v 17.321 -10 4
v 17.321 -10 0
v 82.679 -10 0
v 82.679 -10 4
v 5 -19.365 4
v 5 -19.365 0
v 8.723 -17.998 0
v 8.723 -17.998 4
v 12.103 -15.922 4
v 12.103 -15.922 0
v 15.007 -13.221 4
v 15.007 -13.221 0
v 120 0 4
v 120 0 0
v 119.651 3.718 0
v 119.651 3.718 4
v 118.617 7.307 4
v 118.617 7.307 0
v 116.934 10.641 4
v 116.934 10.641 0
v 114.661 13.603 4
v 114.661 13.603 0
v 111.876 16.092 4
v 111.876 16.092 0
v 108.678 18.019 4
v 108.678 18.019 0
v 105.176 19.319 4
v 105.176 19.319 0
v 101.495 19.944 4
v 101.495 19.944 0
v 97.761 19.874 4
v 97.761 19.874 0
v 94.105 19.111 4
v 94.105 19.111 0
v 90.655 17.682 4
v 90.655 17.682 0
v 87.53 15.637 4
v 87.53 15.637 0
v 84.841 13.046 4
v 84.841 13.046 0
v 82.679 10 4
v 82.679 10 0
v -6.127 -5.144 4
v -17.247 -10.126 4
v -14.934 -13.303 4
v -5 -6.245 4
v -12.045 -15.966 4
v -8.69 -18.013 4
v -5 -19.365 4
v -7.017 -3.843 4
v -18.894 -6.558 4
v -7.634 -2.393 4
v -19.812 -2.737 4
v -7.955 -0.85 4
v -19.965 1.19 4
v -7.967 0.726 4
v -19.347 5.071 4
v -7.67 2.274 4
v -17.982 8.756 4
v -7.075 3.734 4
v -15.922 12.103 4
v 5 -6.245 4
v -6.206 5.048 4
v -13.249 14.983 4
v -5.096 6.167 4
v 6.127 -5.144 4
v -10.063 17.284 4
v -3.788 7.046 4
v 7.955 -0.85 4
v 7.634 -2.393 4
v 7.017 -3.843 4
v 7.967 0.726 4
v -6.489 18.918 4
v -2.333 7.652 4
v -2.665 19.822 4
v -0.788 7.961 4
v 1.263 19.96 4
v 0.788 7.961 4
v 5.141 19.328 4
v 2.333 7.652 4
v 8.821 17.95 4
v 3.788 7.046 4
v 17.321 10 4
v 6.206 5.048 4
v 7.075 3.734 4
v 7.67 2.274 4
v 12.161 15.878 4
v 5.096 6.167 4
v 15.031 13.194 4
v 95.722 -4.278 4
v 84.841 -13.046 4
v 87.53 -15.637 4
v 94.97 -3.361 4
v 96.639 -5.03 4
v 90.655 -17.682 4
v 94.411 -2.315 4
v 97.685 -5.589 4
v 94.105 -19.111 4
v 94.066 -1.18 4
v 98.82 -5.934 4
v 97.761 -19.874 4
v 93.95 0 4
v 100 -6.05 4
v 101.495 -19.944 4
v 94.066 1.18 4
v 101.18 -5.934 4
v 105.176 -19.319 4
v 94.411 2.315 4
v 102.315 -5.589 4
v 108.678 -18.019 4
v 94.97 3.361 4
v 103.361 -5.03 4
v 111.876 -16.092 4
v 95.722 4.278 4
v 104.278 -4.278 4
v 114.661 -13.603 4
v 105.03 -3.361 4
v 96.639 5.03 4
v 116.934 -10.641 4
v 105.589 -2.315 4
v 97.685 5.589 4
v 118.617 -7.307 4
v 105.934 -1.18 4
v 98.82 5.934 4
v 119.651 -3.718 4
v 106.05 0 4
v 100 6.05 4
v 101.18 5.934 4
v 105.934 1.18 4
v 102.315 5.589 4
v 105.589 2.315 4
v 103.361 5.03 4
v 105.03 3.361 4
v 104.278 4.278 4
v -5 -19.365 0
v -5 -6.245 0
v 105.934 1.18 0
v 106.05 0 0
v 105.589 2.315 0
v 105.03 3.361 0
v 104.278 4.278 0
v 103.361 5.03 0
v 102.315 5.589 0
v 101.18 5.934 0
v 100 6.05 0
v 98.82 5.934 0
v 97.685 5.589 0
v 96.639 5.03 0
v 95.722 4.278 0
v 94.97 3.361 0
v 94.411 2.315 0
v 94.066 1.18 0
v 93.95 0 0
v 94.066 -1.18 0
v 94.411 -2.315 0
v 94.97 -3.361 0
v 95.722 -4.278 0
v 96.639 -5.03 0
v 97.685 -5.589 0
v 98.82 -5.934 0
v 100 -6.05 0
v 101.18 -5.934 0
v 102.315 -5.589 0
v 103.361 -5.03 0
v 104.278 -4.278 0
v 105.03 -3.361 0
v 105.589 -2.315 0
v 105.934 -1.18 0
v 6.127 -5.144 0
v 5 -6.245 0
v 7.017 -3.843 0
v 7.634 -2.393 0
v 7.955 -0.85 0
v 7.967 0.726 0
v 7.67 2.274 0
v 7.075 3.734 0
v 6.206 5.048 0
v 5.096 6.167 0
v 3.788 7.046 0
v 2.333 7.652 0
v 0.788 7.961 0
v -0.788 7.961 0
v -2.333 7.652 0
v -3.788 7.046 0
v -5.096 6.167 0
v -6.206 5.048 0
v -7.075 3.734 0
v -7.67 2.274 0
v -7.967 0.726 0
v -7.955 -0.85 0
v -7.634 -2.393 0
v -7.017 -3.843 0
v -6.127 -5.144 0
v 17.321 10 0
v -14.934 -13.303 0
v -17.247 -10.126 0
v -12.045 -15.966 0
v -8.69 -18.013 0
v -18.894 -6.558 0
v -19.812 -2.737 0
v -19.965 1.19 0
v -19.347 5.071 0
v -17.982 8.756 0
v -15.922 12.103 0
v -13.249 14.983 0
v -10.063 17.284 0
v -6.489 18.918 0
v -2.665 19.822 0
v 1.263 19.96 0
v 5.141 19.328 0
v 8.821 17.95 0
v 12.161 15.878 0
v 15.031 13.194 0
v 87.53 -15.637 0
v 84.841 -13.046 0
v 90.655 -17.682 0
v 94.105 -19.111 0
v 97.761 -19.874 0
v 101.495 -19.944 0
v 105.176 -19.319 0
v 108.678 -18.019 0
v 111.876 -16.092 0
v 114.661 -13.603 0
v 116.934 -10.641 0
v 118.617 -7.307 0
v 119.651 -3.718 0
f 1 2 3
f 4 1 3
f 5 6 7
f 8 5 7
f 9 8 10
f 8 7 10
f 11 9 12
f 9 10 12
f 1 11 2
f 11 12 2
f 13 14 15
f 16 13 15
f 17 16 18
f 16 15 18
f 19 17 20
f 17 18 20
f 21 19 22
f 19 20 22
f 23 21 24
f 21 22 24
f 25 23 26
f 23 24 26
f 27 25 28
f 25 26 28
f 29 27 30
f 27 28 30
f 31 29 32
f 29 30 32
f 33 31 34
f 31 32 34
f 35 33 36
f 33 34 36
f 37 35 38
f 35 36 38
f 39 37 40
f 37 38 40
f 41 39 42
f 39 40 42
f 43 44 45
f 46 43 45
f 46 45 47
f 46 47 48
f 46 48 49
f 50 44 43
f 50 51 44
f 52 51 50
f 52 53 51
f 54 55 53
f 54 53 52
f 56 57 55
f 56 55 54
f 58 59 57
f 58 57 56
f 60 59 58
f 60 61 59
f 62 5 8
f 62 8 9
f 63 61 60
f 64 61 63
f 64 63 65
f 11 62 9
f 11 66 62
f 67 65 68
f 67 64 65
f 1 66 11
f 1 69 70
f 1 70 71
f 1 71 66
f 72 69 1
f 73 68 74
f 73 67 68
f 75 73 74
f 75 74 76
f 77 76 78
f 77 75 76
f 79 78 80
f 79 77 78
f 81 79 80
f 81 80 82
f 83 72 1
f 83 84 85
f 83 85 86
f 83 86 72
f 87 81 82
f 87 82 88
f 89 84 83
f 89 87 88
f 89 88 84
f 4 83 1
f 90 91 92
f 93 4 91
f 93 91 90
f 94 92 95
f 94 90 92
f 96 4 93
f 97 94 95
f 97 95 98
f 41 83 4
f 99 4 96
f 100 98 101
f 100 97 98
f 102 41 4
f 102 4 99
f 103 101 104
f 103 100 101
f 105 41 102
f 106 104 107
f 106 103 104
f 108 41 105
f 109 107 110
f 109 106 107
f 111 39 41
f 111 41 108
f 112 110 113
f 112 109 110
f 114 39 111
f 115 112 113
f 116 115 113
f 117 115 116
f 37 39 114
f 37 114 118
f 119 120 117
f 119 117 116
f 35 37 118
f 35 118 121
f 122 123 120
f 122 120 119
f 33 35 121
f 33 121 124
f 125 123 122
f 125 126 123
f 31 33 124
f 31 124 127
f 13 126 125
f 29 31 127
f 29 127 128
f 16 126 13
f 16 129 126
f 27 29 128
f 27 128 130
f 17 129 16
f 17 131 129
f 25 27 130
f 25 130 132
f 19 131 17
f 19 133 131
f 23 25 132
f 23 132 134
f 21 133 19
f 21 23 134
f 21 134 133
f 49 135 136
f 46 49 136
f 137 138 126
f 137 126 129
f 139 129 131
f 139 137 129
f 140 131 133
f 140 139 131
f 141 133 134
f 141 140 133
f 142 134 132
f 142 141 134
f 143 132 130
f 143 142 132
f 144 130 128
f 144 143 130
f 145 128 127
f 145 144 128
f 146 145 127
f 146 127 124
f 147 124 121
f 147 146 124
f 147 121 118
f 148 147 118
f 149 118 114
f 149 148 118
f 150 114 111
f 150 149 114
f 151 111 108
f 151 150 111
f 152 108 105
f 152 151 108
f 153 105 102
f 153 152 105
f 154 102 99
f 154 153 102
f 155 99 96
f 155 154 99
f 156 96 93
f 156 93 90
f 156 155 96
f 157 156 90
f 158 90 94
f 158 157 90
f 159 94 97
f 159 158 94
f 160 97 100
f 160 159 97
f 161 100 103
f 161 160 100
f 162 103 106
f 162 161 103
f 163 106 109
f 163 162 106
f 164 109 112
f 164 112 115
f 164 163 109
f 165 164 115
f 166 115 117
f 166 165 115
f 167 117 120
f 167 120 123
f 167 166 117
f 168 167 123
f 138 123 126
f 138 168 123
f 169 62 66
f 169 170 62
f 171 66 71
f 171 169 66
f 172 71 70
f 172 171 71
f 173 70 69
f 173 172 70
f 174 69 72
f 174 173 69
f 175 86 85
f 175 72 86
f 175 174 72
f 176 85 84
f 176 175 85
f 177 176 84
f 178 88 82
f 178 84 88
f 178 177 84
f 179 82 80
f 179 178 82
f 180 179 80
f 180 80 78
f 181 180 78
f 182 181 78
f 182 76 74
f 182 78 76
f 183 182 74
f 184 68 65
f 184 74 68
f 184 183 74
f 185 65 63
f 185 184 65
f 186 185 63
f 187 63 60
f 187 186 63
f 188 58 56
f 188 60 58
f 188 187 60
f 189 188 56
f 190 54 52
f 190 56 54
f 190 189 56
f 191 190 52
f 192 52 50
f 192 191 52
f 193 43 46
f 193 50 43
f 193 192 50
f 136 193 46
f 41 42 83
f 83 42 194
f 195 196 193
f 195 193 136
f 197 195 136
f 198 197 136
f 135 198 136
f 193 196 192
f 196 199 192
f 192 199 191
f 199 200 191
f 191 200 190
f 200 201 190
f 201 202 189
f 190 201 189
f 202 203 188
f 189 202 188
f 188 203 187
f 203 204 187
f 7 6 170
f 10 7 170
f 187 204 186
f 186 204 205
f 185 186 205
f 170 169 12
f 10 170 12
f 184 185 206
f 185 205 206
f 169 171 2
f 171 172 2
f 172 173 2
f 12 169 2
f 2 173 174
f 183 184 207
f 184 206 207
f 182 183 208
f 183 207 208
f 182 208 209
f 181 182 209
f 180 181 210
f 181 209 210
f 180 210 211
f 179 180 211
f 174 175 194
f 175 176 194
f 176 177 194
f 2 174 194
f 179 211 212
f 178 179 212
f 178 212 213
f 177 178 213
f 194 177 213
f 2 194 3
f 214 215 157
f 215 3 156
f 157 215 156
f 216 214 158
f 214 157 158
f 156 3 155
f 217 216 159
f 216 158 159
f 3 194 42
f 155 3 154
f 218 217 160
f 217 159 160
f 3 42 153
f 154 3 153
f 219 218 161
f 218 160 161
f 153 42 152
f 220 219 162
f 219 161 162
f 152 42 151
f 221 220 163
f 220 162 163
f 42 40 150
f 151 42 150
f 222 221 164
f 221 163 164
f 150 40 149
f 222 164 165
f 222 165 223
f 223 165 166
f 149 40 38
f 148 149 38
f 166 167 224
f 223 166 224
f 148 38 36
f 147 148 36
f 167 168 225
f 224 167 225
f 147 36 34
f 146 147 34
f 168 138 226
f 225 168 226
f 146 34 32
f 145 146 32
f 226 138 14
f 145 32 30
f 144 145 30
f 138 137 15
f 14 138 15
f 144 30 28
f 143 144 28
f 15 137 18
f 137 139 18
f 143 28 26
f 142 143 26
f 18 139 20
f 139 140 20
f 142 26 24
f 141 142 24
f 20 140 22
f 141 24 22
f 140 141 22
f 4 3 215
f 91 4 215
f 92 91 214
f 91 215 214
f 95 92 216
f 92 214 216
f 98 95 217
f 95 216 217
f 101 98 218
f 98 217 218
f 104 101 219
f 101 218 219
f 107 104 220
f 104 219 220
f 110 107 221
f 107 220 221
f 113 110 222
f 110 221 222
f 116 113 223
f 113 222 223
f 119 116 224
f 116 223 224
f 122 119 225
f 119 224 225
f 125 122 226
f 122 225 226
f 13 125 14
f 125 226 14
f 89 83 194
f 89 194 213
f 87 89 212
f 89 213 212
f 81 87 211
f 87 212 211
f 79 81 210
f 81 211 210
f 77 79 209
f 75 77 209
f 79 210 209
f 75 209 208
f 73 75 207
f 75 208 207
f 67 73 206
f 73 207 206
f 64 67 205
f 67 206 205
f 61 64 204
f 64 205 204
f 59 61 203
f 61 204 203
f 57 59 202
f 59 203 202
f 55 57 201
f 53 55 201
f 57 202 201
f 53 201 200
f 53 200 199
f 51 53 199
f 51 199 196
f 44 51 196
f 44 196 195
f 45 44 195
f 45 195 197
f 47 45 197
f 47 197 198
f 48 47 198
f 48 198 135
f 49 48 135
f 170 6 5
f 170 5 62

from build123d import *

# Parameters (mm, degrees)
SKETCH1_R           = 20
BOSS_EXTRUDE1_DEPTH = 4
BOSS_EXTRUDE2_DEPTH = 4
SKETCH4_R           = 8
CUT_EXTRUDE1_DEPTH  = 4
SKETCH5_W           = 10
SKETCH5_H           = 19.132811744
CUT_EXTRUDE3_DEPTH  = 4
SKETCH6_R           = 6.05
CUT_EXTRUDE4_DEPTH  = 4


with BuildPart() as part:
    # Sketch1 → Boss-Extrude1 (new body)
    with BuildSketch(Plane.XY):
        Circle(SKETCH1_R)
    extrude(amount=BOSS_EXTRUDE1_DEPTH)

    # Sketch3 → Boss-Extrude2 (add)
    with BuildSketch(Plane.XY):
        with BuildLine():
            ThreePointArc((120, 0), (105.176380902, 19.318516526), (82.679491924, 10))
            Line((82.679491924, 10), (100, 10))
            Line((100, 10), (100, 0))
            Line((100, 0), (100, -10))
            Line((100, -10), (82.679491924, -10))
            ThreePointArc((82.679491924, -10), (105.176380902, -19.318516526), (120, 0))
        make_face()
        with BuildLine():
            Line((100, 10), (82.679491924, 10))
            ThreePointArc((82.679491924, 10), (80, 0), (82.679491924, -10))
            Line((82.679491924, -10), (100, -10))
            Line((100, -10), (100, 0))
            Line((100, 0), (100, 10))
        make_face()
        with BuildLine():
            Line((82.679491924, 10), (0, 10))
            Line((0, 10), (0, 0))
            Line((0, 0), (0, -10))
            Line((0, -10), (82.679491924, -10))
            ThreePointArc((82.679491924, -10), (80, 0), (82.679491924, 10))
        make_face()
    extrude(amount=BOSS_EXTRUDE2_DEPTH)

    # Sketch4 → Cut-Extrude1 (cut)
    with BuildSketch(Plane.XY):
        Circle(SKETCH4_R)
    extrude(amount=CUT_EXTRUDE1_DEPTH, mode=Mode.SUBTRACT)

    # Sketch5 → Cut-Extrude3 (cut)
    with BuildSketch(Plane.XY):
        with Locations((0, -14.406019059)):
            Rectangle(SKETCH5_W, SKETCH5_H)
    extrude(amount=CUT_EXTRUDE3_DEPTH, mode=Mode.SUBTRACT)

    # Sketch6 → Cut-Extrude4 (cut)
    with BuildSketch(Plane.XY):
        with Locations((100, 0)):
            Circle(SKETCH6_R)
    extrude(amount=CUT_EXTRUDE4_DEPTH, mode=Mode.SUBTRACT)


solid = part.part
